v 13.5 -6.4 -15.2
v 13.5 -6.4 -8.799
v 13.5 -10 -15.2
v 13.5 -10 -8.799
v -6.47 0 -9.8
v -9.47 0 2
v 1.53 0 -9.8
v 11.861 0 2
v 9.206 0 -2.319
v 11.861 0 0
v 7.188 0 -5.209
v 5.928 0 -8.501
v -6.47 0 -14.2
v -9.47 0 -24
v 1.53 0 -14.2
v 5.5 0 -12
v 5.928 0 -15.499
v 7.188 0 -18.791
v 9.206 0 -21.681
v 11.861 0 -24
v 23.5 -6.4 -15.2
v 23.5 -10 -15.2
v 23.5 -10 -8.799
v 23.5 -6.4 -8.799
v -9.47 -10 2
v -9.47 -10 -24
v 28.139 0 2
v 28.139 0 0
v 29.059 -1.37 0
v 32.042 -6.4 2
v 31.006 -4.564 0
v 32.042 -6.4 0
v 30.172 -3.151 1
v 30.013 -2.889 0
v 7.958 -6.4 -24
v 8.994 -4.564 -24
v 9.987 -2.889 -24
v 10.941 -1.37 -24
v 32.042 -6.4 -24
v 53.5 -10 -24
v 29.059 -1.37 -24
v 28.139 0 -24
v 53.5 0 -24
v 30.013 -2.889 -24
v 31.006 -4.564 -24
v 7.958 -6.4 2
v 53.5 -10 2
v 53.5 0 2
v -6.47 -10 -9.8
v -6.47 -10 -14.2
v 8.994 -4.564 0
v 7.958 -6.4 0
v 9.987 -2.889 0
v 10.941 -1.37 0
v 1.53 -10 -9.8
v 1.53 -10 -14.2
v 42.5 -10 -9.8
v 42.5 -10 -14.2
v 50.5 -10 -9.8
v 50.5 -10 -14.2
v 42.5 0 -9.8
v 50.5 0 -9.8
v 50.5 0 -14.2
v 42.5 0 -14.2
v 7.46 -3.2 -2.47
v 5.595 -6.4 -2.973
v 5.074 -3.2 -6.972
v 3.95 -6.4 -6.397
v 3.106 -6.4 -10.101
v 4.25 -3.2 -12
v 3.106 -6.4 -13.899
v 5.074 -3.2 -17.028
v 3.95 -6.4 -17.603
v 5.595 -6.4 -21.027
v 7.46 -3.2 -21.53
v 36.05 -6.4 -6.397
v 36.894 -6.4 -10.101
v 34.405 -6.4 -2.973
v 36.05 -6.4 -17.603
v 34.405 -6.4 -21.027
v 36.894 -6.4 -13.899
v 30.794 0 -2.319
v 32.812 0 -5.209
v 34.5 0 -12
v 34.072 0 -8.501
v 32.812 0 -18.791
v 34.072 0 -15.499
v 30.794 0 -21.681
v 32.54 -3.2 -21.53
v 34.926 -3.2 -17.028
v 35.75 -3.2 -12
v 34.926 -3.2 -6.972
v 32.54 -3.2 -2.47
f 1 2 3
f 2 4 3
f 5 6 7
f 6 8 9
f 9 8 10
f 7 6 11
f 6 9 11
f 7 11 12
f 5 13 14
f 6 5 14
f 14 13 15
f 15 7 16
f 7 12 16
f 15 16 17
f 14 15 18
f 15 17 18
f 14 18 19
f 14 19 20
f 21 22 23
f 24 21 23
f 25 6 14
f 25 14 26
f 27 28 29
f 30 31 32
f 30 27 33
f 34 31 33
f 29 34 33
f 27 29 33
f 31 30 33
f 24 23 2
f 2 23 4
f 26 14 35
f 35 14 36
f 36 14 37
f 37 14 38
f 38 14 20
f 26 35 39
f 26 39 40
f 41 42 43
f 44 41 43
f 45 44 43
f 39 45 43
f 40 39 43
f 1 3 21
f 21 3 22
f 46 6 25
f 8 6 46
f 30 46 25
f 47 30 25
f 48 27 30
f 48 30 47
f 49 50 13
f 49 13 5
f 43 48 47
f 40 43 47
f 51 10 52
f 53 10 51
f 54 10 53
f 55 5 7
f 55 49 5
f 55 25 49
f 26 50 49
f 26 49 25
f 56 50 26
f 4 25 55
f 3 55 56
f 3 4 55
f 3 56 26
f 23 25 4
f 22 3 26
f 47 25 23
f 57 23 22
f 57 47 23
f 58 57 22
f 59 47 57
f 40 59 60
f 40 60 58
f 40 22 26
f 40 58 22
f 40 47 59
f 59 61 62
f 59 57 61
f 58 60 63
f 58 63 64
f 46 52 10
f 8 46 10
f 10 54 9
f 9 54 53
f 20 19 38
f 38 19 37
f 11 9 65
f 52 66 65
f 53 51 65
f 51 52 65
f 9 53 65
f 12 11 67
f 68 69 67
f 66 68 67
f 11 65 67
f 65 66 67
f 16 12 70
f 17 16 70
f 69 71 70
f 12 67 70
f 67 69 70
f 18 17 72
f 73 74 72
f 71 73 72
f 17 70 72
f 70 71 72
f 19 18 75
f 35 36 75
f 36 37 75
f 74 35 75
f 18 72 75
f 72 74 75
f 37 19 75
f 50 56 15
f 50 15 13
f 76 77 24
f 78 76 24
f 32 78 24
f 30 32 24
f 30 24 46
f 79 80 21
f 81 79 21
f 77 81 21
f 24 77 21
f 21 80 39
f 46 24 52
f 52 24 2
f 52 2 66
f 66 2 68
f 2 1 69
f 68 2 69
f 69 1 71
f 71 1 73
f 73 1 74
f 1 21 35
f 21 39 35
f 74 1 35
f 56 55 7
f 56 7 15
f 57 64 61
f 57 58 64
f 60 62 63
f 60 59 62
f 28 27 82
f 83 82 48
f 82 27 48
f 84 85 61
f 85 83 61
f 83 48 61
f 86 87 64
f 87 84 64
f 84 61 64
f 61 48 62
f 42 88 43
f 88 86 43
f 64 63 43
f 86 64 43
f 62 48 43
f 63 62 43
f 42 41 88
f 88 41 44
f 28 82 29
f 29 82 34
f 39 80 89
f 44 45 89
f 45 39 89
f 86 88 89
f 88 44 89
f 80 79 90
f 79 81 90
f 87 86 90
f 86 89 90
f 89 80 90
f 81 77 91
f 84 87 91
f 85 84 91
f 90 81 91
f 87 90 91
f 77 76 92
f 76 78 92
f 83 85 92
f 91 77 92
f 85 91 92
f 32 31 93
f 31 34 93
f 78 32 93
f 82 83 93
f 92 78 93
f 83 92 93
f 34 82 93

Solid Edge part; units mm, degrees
sketch "Sketch1" plane through (0, 0, 0) normal (0, -1, 0) x (1, 0, 0)
  line L0 (0, 0) -> (0, -24)
  line L1 (0, -24) -> (40, -24)
  line L2 (40, -24) -> (40, 0)
  line L3 (40, 0) -> (0, 0)
extrude "Protrusion1" add sketch "Sketch1" along normal blind 10
sketch "Sketch2" plane through (20, -10, -12) normal (0, -1, 0) x (1, 0, 0)
  circle A0 centre (-1.5, 0) radius 3.2
  dimension "D1" = 18.5
  dimension "D2" = 12
  dimension "D3" = 6.4
extrude "ExtrudedCutout_1" cut sketch "Sketch2" against normal blind 73.4208
sketch "Sketch3" plane through (20, -5, -12) normal (0, 0, -1) x (-1, 0, 0)
  line L0 (0, 5) -> (14.5, 5)
  line L1 (14.5, 5) -> (17, -1.4)
  line L2 (17, -1.4) -> (0, -1.4)
  dimension "D1" = 5.5
  dimension "D2" = 3.6
  dimension "D3" = 14.5
  dimension "D4" = 17
revolve "RevolvedCutout1" cut sketch "Sketch3" angle 360 about axis through (20, -10, -12) along (0, -1, 0)
sketch "Sketch4" plane through (20, -5, -12) normal (0, 0, -1) x (-1, 0, 0)
  line L0 (-20, 5) -> (-33.5002, 5)
  line L1 (-33.5002, 5) -> (-33.5002, -5)
  line L2 (-33.5002, -5) -> (-20, -5)
  line L3 (-20, -5) -> (-20, 5)
  line L4 (20, 5) -> (20, -5)
  line L5 (20, -5) -> (28, -5)
  line L6 (28, -5) -> (28, 5)
  line L7 (28, 5) -> (20, 5)
  dimension "D1" = 8
extrude "Protrusion2" add sketch "Sketch4" along normal up to surface (24 mm away) from surface at -12
sketch "Sketch5" plane through (22.7501, -5, 0) normal (0, 0, 1) x (-1, 0, 0)
  spline S0 degree 3 poles (-5.3893, -5) (-6.1043, -3.9725) (-6.7754, -2.9183) (-8.0674, -0.7797) (-8.6877, 0.3051) (-9.2915, 1.4) knots 0 0 0 0 0.5 0.5 1 1 1 1
  line L0 (-9.2915, 1.4) -> (-4.8846, 1.4)
  line L1 (-4.8846, 1.4) -> (10.7035, 1.4)
  line L2 (10.7035, 1.4) -> (14.7917, 1.4)
  line L3 (14.7917, 1.4) -> (10.8895, -5)
  line L4 (10.8895, -5) -> (30.7501, -5)
  line L5 (30.7501, -5) -> (30.7501, 5)
  line L6 (30.7501, 5) -> (-30.7501, 5)
  line L7 (-30.7501, 5) -> (-30.7501, -5)
  line L8 (-5.3893, -5) -> (-30.7501, -5)
extrude "Protrusion3" add sketch "Sketch5" along normal up to vertex (2 mm away)
sketch "Sketch6" plane through (22.7501, -5, 2) normal (0, 0, 1) x (-1, 0, 0)
  line L0 (32.2203, -5) -> (30.7501, -5)
  line L1 (30.7501, 5) -> (30.7501, -5)
  line L2 (32.2203, 5) -> (30.7501, 5)
  line L3 (32.2203, -5) -> (32.2203, 5)
extrude "Protrusion4" add sketch "Sketch6" against normal up to vertex (26 mm away)
sketch "Sketch7" plane through (22.015, -10, -11) normal (0, -1, 0) x (-1, 0, 0)
  line L0 (-28.4852, 3.2) -> (-20.4852, 3.2)
  line L1 (-20.4852, 3.2) -> (-20.4852, -1.2)
  line L2 (-20.4852, -1.2) -> (-28.4852, -1.2)
  line L3 (-28.4852, -1.2) -> (-28.4852, 3.2)
  dimension "D1" = 8
  dimension "D2" = 4.4
  dimension "D3" = 3
extrude "ExtrudedCutout_3" cut sketch "Sketch7" against normal blind 37.6385
mirror "Mirror1" about plane through (22.0152, -5, -11) normal (1, 0, 0) of "ExtrudedCutout_3"
sketch "Sketch8" plane through (22.015, -10, -11) normal (0, -1, 0) x (-1, 0, 0)
  line L0 (-1.485, 4.2) -> (-1.485, -2.2007)
  line L1 (-1.485, -2.2007) -> (8.515, -2.2007)
  line L2 (8.515, -2.2007) -> (8.515, 4.2)
  line L3 (8.515, 4.2) -> (-1.485, 4.2)
  dimension "D1" = 6.4007
  dimension "D2" = 10
  dimension "D3" = 1.8
extrude "ExtrudedCutout_4" cut sketch "Sketch8" against normal blind 87.6344
